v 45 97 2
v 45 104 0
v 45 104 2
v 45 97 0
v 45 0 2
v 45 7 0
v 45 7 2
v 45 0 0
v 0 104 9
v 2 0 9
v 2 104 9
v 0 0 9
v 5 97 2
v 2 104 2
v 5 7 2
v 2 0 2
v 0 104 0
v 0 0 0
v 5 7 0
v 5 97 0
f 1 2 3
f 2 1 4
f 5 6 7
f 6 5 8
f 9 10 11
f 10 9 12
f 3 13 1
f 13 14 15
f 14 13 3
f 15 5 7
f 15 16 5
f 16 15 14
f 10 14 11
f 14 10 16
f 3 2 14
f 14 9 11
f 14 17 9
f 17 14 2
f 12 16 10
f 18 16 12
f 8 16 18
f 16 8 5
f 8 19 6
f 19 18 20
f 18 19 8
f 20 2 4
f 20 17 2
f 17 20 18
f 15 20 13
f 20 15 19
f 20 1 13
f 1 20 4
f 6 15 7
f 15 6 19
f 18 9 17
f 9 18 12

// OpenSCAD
difference()
{
cube([45,104,9]);
union()
{
translate([2,0,2]) cube([43,104,7]);
translate([5,7,0]) cube([40,90,9]);
}
}
